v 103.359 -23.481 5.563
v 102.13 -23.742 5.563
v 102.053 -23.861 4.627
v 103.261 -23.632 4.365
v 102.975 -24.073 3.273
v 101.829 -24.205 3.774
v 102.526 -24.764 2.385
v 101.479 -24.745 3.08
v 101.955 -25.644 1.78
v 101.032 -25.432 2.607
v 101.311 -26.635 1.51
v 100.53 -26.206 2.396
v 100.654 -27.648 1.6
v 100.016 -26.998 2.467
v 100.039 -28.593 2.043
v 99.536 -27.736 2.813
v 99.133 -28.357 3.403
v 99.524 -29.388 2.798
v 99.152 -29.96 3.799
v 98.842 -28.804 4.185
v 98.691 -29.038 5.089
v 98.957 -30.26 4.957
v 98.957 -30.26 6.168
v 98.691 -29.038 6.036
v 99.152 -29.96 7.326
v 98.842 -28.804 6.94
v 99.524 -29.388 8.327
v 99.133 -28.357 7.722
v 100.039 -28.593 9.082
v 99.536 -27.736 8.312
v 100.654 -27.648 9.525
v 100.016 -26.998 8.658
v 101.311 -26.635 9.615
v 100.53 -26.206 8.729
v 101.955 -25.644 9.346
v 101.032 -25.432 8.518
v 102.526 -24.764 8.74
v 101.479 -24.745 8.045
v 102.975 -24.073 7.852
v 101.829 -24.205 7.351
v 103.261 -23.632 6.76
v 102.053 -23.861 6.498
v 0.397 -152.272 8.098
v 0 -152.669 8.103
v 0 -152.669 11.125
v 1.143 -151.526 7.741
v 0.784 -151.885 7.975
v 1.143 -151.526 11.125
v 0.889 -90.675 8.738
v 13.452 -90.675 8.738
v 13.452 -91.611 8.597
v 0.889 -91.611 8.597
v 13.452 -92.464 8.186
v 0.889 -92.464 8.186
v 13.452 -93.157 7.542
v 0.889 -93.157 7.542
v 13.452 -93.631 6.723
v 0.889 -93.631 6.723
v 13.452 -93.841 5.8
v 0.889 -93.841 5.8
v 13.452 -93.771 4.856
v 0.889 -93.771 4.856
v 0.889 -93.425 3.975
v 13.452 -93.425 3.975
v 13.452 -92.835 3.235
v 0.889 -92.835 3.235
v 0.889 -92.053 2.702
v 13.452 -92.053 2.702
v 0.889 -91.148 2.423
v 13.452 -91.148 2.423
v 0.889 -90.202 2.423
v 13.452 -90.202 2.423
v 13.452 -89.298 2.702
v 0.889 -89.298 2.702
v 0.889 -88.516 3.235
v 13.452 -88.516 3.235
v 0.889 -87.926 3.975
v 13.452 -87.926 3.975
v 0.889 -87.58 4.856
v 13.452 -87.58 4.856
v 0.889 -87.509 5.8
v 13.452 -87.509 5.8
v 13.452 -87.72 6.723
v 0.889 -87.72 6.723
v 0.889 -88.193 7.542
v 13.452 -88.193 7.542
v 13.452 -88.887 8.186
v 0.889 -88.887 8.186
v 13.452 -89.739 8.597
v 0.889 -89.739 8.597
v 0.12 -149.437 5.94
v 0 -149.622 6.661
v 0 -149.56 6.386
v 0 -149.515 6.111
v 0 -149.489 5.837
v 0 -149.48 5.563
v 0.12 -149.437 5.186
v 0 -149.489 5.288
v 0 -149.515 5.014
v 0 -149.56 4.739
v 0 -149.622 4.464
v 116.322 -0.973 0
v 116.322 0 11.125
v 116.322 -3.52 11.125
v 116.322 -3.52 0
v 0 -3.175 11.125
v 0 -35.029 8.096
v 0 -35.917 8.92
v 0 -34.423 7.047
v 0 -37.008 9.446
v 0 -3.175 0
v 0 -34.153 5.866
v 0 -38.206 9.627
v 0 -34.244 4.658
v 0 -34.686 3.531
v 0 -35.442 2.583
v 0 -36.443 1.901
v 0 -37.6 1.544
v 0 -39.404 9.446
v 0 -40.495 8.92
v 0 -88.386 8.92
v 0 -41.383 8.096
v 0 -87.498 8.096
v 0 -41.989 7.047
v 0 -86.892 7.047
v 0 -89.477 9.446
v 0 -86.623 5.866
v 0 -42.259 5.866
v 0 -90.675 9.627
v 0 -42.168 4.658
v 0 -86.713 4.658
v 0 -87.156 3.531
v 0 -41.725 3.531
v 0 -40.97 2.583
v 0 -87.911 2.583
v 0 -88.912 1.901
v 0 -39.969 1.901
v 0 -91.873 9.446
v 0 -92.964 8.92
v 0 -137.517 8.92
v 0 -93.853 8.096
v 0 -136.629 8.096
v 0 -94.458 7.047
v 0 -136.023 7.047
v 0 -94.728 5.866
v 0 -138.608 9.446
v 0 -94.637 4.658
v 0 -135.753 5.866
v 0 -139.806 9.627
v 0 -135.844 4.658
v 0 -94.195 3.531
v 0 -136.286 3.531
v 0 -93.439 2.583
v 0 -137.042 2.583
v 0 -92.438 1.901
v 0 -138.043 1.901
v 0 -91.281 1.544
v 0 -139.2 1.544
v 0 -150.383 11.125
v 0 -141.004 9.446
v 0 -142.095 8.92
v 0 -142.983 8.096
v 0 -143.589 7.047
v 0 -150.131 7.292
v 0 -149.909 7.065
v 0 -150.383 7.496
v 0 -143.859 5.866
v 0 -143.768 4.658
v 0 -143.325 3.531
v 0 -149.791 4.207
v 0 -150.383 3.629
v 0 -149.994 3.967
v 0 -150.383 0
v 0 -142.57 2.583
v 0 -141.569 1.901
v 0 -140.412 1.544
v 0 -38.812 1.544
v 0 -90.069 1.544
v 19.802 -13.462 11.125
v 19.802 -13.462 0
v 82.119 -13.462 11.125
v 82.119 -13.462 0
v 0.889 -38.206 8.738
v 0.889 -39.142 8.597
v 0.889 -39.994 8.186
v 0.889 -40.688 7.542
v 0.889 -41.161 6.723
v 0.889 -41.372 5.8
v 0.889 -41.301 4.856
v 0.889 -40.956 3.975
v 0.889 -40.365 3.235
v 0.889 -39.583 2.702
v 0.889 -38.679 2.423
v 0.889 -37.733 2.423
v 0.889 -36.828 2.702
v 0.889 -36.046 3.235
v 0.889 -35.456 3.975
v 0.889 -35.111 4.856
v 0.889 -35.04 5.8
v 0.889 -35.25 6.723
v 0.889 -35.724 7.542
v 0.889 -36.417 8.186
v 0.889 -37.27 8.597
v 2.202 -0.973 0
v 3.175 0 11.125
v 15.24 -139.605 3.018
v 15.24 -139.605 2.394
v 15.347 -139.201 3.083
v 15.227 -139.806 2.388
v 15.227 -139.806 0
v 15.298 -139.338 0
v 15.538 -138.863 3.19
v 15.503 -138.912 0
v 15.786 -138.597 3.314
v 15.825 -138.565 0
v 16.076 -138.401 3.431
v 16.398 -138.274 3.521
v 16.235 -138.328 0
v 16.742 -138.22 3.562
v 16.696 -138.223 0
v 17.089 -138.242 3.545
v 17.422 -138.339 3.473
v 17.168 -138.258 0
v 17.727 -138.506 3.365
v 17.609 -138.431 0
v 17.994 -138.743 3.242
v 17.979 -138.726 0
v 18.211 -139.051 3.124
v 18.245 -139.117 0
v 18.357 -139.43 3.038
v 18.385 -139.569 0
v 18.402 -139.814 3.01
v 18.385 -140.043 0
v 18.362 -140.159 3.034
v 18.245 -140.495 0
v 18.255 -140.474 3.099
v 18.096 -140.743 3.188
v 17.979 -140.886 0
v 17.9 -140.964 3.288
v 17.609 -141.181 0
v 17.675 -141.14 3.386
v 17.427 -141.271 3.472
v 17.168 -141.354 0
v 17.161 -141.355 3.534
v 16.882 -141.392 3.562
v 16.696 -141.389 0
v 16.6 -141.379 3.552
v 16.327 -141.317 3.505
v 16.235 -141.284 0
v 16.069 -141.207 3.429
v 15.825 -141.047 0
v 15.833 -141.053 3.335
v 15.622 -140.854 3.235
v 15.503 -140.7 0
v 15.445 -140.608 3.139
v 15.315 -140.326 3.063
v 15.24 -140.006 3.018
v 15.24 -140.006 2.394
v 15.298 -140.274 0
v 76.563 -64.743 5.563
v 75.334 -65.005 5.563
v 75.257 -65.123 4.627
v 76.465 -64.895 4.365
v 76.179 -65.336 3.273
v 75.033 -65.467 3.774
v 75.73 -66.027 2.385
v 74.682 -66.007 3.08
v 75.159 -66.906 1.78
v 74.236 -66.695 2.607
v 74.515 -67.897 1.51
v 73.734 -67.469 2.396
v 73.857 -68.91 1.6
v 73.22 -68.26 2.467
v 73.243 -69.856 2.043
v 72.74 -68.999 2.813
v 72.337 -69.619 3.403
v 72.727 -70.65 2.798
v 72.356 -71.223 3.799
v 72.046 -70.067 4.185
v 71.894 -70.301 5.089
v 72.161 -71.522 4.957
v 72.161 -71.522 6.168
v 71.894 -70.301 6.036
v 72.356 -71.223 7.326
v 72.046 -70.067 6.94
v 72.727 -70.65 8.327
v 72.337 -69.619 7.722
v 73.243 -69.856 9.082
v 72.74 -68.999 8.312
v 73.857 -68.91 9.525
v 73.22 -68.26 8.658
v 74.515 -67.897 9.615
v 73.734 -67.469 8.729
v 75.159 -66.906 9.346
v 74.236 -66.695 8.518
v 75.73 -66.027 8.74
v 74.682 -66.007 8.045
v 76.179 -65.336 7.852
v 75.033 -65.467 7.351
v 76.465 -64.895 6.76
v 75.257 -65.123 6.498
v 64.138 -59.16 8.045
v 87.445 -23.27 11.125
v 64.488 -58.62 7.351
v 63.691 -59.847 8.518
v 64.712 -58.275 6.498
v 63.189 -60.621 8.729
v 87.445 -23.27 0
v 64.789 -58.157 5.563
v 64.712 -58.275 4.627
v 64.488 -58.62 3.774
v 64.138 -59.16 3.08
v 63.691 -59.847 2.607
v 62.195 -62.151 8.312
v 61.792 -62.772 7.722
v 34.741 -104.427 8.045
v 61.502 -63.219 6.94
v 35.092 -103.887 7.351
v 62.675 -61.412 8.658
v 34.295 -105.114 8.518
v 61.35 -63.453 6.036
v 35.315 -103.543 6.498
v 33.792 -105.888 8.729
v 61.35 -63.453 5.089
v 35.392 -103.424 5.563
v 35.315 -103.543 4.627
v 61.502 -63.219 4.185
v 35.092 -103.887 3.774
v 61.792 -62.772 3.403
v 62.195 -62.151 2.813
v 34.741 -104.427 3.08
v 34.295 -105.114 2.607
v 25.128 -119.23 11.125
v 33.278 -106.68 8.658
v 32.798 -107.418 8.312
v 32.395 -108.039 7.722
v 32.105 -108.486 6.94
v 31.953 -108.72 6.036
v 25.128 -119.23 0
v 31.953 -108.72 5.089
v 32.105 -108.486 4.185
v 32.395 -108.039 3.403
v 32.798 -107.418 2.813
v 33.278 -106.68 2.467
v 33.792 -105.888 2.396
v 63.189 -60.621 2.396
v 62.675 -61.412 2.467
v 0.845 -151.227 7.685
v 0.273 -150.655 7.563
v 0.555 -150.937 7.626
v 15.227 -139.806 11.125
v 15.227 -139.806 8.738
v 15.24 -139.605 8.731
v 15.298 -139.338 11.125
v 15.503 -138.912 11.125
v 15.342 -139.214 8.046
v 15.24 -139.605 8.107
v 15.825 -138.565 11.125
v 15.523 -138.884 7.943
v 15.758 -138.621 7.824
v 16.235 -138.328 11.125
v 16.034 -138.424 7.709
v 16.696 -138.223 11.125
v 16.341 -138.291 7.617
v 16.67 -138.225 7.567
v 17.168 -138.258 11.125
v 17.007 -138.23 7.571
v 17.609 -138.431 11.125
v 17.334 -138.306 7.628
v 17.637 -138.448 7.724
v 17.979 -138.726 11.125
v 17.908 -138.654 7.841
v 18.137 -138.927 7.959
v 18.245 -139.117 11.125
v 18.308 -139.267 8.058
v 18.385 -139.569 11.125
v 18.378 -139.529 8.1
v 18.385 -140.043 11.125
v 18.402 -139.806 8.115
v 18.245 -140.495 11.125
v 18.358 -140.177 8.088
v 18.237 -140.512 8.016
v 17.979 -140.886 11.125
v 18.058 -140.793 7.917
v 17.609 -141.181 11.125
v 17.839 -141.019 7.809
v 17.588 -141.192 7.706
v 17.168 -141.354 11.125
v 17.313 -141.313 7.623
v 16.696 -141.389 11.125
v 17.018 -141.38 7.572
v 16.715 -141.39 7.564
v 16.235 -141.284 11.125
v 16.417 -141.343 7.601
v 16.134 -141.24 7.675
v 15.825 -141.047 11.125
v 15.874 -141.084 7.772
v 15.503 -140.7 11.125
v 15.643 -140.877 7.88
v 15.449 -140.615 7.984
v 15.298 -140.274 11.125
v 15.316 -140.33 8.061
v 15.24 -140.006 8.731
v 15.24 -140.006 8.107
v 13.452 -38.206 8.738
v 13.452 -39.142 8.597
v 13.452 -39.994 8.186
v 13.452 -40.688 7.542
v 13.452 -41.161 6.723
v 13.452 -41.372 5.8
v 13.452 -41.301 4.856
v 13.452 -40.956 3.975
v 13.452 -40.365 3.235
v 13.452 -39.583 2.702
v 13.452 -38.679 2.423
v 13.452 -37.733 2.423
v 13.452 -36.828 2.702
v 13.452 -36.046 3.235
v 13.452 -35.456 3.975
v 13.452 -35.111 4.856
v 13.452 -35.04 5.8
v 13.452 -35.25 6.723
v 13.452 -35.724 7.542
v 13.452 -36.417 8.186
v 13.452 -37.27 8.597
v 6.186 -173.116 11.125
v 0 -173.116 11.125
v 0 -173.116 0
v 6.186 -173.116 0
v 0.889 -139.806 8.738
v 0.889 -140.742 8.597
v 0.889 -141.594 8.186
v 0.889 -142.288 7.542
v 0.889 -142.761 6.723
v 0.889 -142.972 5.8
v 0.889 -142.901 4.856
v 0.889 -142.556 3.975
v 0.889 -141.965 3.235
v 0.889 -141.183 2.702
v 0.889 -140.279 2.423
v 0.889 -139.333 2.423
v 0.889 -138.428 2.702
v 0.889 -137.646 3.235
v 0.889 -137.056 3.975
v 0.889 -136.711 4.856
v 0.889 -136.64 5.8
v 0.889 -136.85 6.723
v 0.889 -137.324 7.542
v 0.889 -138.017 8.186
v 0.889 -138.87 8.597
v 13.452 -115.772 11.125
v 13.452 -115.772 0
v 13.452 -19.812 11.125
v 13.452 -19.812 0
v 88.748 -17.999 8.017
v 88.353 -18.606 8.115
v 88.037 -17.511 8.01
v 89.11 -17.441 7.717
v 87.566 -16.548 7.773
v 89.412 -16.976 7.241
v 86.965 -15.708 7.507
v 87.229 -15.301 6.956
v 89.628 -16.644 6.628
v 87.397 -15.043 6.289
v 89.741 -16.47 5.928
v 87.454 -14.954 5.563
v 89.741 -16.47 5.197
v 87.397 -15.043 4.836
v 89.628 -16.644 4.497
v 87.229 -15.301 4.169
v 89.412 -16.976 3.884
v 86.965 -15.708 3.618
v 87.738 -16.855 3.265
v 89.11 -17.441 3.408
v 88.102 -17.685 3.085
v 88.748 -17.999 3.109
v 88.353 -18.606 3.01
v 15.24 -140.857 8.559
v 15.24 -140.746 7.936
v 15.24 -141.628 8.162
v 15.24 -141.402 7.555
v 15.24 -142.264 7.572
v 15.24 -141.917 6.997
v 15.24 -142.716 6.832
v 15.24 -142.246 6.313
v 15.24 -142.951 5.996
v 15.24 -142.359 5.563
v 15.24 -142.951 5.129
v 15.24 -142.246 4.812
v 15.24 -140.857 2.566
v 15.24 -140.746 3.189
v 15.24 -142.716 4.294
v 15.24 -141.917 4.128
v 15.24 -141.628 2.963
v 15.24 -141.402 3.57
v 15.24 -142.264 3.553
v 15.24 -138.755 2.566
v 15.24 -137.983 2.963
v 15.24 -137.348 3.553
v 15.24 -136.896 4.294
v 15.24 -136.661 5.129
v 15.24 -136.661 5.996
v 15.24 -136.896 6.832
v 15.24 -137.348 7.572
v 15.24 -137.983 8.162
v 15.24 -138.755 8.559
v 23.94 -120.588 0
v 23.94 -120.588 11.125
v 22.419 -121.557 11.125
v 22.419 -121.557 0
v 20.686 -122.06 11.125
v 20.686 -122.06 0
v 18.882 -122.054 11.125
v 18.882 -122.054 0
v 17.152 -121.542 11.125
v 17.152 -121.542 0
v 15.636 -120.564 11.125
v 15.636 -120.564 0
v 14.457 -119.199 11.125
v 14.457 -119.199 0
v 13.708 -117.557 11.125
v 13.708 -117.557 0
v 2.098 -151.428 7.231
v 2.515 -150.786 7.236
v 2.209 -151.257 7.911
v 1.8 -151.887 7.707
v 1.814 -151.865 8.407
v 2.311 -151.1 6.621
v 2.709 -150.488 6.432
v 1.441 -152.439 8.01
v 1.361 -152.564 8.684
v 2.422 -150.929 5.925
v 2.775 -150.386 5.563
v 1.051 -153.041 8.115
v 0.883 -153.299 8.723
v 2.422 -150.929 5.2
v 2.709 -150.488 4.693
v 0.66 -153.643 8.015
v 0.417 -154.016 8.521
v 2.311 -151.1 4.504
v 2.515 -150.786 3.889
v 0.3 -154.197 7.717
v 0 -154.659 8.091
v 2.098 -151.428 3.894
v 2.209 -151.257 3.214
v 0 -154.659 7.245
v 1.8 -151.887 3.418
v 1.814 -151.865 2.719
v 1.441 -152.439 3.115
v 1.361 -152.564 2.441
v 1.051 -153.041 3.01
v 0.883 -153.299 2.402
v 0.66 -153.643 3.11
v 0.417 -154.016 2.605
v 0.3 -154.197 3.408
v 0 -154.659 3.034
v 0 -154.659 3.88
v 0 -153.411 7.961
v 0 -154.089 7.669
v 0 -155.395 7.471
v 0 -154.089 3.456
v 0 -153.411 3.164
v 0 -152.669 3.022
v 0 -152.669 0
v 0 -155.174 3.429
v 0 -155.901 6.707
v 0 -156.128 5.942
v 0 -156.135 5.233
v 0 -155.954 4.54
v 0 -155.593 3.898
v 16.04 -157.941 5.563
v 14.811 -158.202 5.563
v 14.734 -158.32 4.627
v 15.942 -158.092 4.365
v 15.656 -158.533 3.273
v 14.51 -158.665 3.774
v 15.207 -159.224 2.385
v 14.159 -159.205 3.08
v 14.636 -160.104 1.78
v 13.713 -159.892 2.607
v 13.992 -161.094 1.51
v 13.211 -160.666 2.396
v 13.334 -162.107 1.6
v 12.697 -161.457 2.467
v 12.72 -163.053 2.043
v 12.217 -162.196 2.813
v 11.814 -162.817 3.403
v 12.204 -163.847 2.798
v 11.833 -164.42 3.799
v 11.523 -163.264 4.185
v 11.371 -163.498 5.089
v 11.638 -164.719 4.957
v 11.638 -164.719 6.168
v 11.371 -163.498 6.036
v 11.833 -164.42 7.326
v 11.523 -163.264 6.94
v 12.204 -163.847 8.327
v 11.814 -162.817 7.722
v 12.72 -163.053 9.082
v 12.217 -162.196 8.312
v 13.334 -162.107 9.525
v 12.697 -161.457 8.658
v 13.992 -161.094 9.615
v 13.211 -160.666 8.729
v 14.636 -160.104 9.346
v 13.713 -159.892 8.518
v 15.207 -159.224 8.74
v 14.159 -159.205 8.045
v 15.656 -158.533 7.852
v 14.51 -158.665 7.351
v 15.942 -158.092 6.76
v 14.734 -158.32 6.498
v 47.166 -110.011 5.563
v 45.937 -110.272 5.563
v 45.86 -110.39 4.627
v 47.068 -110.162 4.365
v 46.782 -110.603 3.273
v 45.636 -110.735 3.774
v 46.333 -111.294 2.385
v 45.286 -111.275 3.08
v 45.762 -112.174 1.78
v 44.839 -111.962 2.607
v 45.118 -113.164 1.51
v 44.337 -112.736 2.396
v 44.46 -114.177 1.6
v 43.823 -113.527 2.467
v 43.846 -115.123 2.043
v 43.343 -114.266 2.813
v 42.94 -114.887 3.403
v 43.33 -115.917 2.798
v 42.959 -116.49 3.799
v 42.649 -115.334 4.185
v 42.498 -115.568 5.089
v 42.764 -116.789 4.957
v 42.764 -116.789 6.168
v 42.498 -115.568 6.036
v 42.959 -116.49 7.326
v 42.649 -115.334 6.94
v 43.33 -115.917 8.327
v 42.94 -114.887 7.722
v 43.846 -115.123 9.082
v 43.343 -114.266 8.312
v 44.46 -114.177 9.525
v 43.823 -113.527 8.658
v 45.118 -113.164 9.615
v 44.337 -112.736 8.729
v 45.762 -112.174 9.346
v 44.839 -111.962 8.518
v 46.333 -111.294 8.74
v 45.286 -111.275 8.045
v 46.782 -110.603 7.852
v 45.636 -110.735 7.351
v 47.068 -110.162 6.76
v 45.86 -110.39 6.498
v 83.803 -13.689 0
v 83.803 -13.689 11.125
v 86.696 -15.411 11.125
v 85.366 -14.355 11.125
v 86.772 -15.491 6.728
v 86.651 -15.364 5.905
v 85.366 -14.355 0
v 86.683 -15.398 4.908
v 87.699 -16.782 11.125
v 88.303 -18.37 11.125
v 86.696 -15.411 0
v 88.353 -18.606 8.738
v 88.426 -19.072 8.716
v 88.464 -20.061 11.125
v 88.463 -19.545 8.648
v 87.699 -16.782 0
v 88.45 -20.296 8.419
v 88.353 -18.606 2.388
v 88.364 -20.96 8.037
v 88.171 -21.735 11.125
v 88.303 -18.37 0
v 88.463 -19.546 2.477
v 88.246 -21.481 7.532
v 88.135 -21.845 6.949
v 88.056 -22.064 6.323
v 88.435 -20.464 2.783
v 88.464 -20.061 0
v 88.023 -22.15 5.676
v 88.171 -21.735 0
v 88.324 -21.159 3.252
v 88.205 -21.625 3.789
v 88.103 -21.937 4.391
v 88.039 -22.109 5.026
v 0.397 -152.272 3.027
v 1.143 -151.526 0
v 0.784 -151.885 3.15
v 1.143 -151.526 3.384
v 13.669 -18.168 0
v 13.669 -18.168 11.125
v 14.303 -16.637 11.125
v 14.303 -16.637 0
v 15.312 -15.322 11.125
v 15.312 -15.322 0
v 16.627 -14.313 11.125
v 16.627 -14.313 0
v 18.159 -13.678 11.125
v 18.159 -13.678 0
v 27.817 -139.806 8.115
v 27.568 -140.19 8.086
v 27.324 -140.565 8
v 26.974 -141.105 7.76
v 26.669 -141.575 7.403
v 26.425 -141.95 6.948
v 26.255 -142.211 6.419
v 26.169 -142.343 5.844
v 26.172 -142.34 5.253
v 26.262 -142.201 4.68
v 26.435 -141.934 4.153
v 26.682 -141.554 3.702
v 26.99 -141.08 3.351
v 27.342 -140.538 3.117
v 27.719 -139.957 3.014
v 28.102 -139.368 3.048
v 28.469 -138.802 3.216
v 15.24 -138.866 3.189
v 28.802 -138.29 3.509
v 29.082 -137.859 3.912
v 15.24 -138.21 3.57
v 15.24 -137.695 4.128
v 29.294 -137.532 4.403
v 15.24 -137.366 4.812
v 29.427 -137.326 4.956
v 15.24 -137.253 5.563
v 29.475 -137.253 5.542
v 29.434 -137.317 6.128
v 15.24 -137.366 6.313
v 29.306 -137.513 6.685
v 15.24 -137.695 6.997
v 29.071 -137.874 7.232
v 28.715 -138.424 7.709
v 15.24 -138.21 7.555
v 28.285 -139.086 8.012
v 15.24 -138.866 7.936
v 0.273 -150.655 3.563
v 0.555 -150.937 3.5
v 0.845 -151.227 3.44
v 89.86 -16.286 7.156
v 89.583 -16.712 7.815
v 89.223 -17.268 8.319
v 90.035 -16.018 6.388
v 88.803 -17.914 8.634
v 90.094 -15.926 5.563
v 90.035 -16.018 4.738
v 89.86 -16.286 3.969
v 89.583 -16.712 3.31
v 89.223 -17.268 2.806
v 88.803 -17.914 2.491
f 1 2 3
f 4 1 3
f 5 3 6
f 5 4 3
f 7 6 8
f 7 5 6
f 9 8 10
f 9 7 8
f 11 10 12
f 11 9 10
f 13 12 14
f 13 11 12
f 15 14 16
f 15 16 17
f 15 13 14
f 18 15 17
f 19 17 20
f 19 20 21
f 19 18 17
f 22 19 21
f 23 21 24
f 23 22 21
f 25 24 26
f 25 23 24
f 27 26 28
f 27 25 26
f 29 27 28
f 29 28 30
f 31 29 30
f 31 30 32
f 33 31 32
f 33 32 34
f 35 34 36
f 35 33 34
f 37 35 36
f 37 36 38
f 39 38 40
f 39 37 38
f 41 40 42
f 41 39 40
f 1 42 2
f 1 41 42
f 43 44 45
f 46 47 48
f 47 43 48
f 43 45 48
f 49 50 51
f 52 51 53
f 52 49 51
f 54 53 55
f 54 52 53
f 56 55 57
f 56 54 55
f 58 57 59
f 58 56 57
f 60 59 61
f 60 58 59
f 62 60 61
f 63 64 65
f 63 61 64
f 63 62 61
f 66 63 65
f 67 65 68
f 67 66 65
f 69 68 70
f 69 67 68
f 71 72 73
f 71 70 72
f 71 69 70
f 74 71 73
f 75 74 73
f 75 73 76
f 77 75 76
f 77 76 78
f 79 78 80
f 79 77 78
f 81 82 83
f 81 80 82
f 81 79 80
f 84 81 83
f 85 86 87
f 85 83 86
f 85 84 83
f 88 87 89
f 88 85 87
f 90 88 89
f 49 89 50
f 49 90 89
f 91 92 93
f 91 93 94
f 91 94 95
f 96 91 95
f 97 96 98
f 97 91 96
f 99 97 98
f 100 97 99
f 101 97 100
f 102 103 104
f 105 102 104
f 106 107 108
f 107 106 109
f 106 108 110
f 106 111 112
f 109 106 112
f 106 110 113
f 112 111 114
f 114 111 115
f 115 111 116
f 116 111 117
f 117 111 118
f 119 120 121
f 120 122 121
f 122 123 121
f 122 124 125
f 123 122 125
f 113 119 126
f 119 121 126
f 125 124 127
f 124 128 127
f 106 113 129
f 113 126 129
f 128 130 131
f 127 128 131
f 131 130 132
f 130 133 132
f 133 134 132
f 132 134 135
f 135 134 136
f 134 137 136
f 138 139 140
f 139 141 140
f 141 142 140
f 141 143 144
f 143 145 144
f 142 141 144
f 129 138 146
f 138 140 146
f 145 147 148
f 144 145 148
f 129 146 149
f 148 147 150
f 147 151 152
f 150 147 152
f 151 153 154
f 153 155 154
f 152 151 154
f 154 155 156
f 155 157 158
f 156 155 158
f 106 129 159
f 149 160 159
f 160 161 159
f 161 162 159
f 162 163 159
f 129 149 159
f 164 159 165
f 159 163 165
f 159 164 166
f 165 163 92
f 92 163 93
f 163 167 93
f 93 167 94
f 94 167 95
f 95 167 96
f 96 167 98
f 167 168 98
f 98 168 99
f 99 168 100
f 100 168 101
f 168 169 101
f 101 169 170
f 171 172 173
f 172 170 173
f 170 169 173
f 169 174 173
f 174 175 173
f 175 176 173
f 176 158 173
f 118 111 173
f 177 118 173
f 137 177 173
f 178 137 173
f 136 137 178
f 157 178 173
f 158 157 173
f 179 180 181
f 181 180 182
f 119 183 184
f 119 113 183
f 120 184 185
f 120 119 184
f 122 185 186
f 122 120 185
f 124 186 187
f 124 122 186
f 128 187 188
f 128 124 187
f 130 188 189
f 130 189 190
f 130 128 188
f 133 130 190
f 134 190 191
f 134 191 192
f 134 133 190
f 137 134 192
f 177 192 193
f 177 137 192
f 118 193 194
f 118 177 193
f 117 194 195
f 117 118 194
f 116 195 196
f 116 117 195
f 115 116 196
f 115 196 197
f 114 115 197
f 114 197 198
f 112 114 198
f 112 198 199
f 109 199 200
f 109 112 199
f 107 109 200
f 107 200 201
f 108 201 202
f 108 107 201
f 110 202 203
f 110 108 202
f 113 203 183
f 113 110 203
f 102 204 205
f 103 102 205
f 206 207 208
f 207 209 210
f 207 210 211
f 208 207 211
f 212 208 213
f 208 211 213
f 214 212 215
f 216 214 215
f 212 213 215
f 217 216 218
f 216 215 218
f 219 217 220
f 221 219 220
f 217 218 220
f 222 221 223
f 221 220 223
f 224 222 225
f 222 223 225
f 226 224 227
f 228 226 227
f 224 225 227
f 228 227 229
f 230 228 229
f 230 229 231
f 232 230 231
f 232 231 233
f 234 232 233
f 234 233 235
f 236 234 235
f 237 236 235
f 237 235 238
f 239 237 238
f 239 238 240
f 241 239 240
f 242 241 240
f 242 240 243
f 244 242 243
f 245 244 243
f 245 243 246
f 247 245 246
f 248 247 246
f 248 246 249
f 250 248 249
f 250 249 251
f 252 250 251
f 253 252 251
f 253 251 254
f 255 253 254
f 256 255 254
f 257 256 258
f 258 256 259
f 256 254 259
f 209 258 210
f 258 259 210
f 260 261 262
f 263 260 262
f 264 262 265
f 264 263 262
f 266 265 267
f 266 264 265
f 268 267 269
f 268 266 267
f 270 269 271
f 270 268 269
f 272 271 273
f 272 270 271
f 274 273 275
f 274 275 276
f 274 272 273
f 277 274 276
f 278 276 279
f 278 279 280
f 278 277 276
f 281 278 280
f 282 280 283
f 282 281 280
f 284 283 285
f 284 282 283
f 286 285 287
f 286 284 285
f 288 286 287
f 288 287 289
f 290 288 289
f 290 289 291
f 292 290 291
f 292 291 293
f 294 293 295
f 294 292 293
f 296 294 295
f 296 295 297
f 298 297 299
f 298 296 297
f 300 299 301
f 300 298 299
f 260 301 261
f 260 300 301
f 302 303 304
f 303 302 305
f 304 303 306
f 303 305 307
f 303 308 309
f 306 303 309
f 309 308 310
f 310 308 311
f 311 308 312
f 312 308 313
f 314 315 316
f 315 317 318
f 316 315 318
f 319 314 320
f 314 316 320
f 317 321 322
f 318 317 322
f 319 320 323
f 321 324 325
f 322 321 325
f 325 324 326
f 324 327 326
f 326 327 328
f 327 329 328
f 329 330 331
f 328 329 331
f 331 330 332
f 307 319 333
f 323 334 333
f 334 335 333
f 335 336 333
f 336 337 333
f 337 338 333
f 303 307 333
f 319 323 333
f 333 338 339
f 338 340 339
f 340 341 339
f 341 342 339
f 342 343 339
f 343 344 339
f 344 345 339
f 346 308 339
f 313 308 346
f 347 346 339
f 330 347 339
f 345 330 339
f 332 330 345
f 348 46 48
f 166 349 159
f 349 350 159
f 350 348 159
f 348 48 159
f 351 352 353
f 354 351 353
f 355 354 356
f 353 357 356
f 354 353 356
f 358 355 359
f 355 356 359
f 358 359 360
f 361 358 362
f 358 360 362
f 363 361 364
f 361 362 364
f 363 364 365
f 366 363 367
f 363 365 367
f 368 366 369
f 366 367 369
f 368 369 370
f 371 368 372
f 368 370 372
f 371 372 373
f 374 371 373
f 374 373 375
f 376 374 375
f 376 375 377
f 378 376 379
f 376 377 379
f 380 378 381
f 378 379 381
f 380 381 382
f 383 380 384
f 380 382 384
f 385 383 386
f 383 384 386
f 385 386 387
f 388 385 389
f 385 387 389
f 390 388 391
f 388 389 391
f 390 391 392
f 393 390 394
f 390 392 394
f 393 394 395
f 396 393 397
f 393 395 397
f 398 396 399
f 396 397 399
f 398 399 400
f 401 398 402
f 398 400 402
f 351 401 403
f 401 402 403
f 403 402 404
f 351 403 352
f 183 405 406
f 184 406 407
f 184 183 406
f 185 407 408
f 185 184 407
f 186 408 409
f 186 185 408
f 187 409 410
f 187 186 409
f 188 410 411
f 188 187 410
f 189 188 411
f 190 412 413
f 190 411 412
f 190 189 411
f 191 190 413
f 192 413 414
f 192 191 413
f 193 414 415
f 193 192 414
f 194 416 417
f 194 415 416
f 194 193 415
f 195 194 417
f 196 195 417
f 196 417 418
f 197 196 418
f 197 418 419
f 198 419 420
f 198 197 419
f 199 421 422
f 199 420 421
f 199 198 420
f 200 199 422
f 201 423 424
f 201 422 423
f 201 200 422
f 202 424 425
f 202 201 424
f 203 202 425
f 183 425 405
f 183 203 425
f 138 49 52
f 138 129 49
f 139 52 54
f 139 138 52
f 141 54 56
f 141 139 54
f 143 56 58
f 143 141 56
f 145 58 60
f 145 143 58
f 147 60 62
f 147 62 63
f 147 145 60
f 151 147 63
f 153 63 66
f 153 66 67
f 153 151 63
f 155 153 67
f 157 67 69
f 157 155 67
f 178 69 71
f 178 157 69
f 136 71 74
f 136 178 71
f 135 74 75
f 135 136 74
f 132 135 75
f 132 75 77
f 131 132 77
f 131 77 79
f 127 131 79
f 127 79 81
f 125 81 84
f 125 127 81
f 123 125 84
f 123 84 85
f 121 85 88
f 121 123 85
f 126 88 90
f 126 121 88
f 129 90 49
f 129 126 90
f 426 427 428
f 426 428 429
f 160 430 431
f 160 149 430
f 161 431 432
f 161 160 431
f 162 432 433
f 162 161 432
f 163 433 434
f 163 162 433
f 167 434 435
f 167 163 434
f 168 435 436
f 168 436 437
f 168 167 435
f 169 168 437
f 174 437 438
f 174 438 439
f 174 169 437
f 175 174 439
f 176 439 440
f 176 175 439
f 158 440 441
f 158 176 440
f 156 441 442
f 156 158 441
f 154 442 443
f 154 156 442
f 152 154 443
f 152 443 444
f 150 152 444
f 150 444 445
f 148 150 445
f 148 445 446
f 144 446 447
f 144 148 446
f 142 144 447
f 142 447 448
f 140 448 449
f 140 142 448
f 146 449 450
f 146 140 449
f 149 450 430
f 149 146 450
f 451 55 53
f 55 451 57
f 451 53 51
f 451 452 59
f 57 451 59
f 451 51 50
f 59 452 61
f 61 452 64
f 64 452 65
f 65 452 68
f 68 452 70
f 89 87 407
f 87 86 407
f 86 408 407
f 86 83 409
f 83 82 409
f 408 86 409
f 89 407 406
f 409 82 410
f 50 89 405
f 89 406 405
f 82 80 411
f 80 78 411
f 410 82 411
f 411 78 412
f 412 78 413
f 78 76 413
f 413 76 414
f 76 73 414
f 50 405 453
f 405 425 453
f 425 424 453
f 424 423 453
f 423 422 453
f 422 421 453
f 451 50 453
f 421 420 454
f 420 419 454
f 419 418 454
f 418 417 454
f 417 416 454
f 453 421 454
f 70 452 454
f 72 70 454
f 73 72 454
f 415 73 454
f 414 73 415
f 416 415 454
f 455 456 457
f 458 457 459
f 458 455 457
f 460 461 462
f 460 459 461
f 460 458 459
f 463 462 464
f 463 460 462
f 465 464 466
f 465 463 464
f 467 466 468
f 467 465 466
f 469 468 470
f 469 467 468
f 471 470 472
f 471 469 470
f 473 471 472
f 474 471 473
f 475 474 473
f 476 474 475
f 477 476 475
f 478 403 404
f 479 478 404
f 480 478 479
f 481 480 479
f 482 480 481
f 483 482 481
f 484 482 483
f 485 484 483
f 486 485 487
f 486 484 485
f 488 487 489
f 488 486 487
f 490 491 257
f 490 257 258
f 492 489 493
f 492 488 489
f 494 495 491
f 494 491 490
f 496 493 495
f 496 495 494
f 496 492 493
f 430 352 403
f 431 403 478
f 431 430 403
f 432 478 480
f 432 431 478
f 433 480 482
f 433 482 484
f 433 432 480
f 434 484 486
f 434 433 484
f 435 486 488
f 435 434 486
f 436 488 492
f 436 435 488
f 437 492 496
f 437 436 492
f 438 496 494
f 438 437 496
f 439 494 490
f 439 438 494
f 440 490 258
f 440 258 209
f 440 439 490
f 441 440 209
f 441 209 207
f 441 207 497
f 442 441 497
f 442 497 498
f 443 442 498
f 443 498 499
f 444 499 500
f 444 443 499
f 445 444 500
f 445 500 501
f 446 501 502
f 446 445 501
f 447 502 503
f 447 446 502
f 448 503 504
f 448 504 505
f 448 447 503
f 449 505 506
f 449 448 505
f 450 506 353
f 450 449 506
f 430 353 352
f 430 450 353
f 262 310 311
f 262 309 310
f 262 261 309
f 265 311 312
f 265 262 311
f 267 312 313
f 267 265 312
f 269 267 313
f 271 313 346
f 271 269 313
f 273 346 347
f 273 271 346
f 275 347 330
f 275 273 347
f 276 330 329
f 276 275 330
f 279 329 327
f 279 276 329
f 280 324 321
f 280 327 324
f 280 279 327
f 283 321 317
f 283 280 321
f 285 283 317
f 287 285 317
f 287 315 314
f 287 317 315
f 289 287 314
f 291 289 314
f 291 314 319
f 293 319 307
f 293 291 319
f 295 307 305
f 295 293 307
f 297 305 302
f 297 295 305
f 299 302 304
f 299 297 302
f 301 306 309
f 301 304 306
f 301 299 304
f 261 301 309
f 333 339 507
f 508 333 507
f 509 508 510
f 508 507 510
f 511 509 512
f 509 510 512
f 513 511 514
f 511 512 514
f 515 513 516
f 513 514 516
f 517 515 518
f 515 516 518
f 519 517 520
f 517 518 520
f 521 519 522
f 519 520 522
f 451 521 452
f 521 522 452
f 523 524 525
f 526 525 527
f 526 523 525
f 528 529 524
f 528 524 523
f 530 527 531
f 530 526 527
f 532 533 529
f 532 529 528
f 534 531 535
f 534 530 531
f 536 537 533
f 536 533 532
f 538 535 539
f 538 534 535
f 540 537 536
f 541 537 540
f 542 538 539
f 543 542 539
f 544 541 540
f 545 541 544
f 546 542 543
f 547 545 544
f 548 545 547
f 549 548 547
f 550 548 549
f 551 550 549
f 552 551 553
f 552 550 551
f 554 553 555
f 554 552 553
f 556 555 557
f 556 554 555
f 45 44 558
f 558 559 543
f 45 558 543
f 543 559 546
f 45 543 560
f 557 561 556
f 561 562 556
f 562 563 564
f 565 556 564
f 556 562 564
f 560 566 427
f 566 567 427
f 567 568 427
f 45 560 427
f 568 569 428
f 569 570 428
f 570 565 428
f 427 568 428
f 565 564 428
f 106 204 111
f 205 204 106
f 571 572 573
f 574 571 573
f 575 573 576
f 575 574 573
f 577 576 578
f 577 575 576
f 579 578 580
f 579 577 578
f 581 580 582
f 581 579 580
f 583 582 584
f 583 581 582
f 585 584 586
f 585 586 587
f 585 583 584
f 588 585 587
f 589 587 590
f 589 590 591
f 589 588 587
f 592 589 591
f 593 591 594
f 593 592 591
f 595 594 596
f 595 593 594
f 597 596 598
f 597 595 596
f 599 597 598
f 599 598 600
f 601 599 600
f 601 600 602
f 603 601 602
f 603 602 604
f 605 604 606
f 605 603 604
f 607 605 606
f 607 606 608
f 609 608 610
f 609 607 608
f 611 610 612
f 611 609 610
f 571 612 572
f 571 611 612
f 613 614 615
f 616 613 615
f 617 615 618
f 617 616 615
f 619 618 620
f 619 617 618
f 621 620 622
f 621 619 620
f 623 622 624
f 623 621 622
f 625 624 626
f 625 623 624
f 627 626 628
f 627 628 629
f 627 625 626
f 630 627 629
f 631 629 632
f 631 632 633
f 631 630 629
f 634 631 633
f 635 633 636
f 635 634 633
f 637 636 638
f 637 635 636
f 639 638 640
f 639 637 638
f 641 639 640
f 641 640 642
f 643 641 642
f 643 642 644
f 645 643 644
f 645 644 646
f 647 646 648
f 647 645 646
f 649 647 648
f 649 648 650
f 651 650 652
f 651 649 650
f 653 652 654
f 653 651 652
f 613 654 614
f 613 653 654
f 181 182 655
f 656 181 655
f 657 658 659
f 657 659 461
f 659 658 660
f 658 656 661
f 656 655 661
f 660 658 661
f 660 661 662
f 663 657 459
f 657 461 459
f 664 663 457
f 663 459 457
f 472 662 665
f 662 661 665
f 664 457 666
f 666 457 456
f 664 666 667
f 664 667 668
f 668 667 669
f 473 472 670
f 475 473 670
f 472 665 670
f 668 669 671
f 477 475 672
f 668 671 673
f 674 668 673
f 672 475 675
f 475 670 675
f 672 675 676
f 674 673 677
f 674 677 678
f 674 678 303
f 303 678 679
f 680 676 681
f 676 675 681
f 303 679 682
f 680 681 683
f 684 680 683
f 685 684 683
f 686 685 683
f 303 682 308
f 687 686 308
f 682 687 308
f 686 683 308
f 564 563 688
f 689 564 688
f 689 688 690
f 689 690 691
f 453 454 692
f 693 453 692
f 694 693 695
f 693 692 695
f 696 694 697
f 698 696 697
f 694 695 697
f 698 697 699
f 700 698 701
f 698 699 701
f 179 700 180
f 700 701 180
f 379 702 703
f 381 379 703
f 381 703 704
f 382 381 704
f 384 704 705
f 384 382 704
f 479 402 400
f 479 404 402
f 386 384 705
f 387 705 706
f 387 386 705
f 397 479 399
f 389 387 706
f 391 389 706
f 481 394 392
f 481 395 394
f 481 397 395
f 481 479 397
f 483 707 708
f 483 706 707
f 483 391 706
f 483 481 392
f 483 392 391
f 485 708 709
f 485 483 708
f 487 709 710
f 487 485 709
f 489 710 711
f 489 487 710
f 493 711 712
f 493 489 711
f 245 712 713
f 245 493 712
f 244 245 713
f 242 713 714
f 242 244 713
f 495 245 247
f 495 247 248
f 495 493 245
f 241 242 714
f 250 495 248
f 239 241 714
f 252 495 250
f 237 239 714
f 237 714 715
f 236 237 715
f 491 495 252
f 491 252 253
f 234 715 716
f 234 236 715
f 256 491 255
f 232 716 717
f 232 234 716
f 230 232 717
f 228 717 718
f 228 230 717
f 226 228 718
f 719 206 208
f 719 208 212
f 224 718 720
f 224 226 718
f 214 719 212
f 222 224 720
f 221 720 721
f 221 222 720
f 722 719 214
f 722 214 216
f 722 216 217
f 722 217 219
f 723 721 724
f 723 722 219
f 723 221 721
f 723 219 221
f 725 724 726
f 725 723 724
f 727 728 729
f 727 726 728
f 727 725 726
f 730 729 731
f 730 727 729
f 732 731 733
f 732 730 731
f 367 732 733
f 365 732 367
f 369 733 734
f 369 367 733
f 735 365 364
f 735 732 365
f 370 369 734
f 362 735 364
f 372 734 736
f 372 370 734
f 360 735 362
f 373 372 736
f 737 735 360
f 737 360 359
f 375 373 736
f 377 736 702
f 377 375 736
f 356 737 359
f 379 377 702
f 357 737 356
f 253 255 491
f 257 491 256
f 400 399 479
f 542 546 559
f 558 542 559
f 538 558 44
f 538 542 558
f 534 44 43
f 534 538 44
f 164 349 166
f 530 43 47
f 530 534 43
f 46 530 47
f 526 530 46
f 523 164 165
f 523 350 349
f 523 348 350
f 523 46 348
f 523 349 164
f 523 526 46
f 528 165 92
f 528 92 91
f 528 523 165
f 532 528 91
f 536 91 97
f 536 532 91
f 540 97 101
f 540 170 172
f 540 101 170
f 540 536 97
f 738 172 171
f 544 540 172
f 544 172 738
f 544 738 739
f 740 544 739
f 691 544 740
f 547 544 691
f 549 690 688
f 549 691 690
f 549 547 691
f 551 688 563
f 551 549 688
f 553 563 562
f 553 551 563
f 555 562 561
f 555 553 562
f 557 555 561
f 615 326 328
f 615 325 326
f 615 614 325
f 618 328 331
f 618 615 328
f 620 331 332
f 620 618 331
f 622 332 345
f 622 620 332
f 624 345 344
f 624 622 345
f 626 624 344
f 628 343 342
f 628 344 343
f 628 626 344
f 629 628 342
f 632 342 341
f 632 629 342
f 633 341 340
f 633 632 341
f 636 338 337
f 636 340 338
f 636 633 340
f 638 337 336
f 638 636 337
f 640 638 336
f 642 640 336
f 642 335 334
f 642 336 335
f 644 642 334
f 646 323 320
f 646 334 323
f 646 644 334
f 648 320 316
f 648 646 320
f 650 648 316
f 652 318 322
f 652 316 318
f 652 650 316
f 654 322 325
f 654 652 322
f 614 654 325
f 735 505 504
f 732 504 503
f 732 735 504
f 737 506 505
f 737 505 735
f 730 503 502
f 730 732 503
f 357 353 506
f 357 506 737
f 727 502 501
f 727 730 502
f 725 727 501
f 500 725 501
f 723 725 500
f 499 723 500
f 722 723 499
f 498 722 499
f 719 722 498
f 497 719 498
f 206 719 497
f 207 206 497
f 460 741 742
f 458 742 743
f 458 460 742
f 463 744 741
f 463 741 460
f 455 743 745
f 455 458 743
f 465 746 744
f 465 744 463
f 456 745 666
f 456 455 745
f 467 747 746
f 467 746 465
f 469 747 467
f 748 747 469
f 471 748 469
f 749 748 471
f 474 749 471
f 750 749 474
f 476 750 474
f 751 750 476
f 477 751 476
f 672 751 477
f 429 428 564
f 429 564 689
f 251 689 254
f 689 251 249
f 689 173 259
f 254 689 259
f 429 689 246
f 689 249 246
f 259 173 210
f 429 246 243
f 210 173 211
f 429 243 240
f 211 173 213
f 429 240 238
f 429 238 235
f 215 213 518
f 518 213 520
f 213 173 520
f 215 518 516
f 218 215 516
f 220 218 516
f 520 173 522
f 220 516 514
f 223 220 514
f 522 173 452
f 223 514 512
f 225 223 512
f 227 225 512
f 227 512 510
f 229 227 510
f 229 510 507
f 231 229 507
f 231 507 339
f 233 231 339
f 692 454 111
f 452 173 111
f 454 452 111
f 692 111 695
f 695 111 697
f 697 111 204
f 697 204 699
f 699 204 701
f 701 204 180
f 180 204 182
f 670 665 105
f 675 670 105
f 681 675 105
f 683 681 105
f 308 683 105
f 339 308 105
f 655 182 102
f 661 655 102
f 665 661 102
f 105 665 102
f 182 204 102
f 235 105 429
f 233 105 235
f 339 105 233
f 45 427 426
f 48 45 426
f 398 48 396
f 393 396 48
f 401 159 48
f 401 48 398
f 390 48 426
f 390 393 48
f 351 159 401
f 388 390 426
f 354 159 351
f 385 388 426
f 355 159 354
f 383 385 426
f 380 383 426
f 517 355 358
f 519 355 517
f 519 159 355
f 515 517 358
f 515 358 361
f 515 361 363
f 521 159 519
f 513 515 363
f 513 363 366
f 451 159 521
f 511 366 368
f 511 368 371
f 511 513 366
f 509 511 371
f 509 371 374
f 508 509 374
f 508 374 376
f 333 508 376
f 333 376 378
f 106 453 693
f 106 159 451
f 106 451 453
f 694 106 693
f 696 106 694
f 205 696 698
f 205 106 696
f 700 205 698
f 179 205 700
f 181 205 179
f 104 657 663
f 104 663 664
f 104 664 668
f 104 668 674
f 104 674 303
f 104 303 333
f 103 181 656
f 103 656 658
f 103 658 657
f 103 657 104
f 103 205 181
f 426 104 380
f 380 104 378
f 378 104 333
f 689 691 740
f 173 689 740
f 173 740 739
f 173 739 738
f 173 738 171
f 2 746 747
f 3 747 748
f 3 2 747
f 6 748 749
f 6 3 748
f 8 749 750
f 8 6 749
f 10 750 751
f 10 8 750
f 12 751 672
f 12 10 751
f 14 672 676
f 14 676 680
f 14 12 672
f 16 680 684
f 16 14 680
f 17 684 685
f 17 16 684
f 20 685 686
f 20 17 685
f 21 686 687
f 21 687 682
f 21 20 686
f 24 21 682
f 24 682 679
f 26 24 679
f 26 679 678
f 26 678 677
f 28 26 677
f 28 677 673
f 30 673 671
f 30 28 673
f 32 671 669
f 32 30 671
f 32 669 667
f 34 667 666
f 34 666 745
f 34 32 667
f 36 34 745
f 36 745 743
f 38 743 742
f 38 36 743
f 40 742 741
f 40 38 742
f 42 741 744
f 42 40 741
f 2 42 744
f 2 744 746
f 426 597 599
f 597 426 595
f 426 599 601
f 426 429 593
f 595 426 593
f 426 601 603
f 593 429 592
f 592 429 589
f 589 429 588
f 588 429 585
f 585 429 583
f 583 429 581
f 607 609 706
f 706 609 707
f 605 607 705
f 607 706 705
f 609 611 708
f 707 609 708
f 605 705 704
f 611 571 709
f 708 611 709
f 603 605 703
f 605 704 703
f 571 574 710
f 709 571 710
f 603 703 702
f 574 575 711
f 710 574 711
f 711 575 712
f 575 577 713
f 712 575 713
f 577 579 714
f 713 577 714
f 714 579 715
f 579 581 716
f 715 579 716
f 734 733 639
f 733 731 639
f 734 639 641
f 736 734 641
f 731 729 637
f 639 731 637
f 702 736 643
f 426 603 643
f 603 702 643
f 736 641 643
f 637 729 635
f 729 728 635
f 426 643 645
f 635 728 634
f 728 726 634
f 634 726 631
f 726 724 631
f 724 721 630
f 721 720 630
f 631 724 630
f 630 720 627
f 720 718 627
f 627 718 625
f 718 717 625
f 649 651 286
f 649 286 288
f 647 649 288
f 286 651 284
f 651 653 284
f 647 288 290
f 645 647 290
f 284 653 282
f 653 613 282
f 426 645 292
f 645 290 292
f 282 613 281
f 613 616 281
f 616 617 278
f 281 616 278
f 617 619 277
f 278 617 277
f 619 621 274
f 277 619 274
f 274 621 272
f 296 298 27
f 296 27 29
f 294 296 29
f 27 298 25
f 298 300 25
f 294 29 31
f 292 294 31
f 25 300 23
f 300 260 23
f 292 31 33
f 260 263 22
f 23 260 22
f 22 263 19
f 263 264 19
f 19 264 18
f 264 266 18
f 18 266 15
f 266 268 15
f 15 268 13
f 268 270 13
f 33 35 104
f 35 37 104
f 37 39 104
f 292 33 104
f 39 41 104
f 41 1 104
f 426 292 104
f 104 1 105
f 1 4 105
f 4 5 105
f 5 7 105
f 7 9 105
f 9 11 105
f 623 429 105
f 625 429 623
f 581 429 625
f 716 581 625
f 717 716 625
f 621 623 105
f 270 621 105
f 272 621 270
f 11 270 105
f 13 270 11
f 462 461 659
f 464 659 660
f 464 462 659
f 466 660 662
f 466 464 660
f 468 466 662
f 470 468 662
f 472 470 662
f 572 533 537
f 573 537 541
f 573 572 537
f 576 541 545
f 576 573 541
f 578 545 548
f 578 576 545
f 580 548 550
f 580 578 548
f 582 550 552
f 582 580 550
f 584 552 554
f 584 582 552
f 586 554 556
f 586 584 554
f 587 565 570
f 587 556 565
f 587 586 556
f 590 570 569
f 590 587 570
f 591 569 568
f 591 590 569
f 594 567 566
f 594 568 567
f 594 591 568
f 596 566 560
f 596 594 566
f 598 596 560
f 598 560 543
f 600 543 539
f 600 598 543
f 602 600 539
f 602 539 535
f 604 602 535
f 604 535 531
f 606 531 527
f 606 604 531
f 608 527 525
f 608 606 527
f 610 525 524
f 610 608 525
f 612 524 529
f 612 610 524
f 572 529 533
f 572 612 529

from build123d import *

# Parameters (mm, degrees)
BOSS_EXTRUDE1_DEPTH              = 11.1252
F_1_4_20_TAPPED_HOLE1_AT_2_COUNT = 2
F_1_4_20_TAPPED_HOLE1_AT_2_PITCH = 101.6
F_1_4_20_TAPPED_HOLE1_AT_3_COUNT = 2
F_1_4_20_TAPPED_HOLE1_AT_3_PITCH = 49.130736385
F_1_4_20_TAPPED_HOLE2_AT_2_COUNT = 2
F_1_4_20_TAPPED_HOLE2_AT_2_PITCH = 53.975
F_1_4_20_TAPPED_HOLE2_AT_3_COUNT = 2
F_1_4_20_TAPPED_HOLE2_AT_3_PITCH = 111.125
F_1_4_20_TAPPED_HOLE2_AT_4_COUNT = 2
F_1_4_20_TAPPED_HOLE2_AT_4_PITCH = 49.1998
CUT_EXTRUDE1_DEPTH               = 12.1252001
CHAMFER3_SIZE                    = 3.175
CUT_EXTRUDE2_DEPTH               = 119.608154476
CUT_EXTRUDE3_DEPTH               = 12.1252001
F_1_8_0_125_DIAMETER_HOLE1_D     = 3.175
CUT_EXTRUDE4_DEPTH               = 12.1252001


with BuildPart() as part:
    # Sketch1 → Boss-Extrude1 (new body)
    with BuildSketch(Plane.XY):
        Polygon((0, 0), (0, -182.6405415), (118.608154476, 0), align=None)
        with BuildLine():
            Line((19.802154476, -13.462), (82.118989682, -13.462))
            ThreePointArc((82.118989682, -13.462), (87.699478347, -16.782041872), (87.444547788, -23.270457872))
            Line((87.444547788, -23.270457872), (25.127712583, -119.229969062))
            ThreePointArc((25.127712583, -119.229969062), (17.998657037, -121.860016506), (13.452154476, -115.771511189))
            Line((13.452154476, -115.771511189), (13.452154476, -19.812))
            ThreePointArc((13.452154476, -19.812), (15.312026416, -15.321871939), (19.802154476, -13.462))
        make_face(mode=Mode.SUBTRACT)
    extrude(amount=BOSS_EXTRUDE1_DEPTH)

    # Sketch3 → 1/4-20 Tapped Hole1 (revolve, cut)
    with BuildSketch(Plane(origin=(0, -139.805902277, 5.5626), x_dir=(0, 0, 1), z_dir=(0, 1, 0))):
        Polygon((0, 0), (0, 32.217016902), (2.5527, 30.6832), (2.5527, 15.24), (3.175, 15.24), (3.175, 0.889), (4.064, 0), align=None)
    f_1_4_20_tapped_hole1 = revolve(axis=Axis((-6.35, -139.805902277, 5.5626), (1, 0, 0)), mode=Mode.SUBTRACT)

    # 1/4-20 Tapped Hole1 at 2: 1/4-20 Tapped Hole1 ×2
    with Locations(*[(0, i * F_1_4_20_TAPPED_HOLE1_AT_2_PITCH, 0) for i in range(1, F_1_4_20_TAPPED_HOLE1_AT_2_COUNT)]):
        add(f_1_4_20_tapped_hole1, mode=Mode.SUBTRACT)

    # 1/4-20 Tapped Hole1 at 3: 1/4-20 Tapped Hole1 ×2
    with Locations(*[(0, i * F_1_4_20_TAPPED_HOLE1_AT_3_PITCH, 0) for i in range(1, F_1_4_20_TAPPED_HOLE1_AT_3_COUNT)]):
        add(f_1_4_20_tapped_hole1, mode=Mode.SUBTRACT)

    # Sketch6 → 1/4-20 Tapped Hole2 (revolve, cut)
    with BuildSketch(Plane(origin=(74.349919226, -68.151705822, 5.5626), x_dir=(0.544639035, 0.838670568, 0), z_dir=(0, 0, 1))):
        Polygon((0, 0), (0, 19.517016902), (2.5527, 17.9832), (2.5527, 15.24), (3.175, 15.24), (3.175, 0.889), (4.064, 0), align=None)
    f_1_4_20_tapped_hole2 = revolve(axis=Axis((79.675477332, -71.610163694, 5.5626), (-0.838670568, 0.544639035, 0)), mode=Mode.SUBTRACT)

    # 1/4-20 Tapped Hole2 at 2: 1/4-20 Tapped Hole2 ×2
    with Locations(*[Vector(-0.544639035, -0.838670568, 0) * (i * F_1_4_20_TAPPED_HOLE2_AT_2_PITCH) for i in range(1, F_1_4_20_TAPPED_HOLE2_AT_2_COUNT)]):
        add(f_1_4_20_tapped_hole2, mode=Mode.SUBTRACT)

    # 1/4-20 Tapped Hole2 at 3: 1/4-20 Tapped Hole2 ×2
    with Locations(*[Vector(-0.544639035, -0.838670568, 0) * (i * F_1_4_20_TAPPED_HOLE2_AT_3_PITCH) for i in range(1, F_1_4_20_TAPPED_HOLE2_AT_3_COUNT)]):
        add(f_1_4_20_tapped_hole2, mode=Mode.SUBTRACT)

    # 1/4-20 Tapped Hole2 at 4: 1/4-20 Tapped Hole2 ×2
    with Locations(*[Vector(0.544639035, 0.838670568, 0) * (i * F_1_4_20_TAPPED_HOLE2_AT_4_PITCH) for i in range(1, F_1_4_20_TAPPED_HOLE2_AT_4_COUNT)]):
        add(f_1_4_20_tapped_hole2, mode=Mode.SUBTRACT)

    # Sketch8 → Cut-Extrude1 (cut, through all)
    with BuildSketch(Plane.XY.offset(11.1252)):
        Polygon((0, -182.6405415), (0, -173.1155415), (6.185607325, -173.1155415), align=None)
    extrude(amount=-CUT_EXTRUDE1_DEPTH, mode=Mode.SUBTRACT)

    # Chamfer3
    chamfer3_edges = [part.edges().sort_by_distance(p)[0] for p in [
        (0, 0, 5.5626),
    ]]
    chamfer(chamfer3_edges, length=CHAMFER3_SIZE)

    # Sketch9 → Cut-Extrude2 (cut, through all)
    with BuildSketch(Plane.ZY):
        Polygon((11.1252, 0), (0, 0), (0, -0.973328879), align=None)
    extrude(amount=-CUT_EXTRUDE2_DEPTH, mode=Mode.SUBTRACT)

    # Sketch10 → Cut-Extrude3 (cut, through all)
    with BuildSketch(Plane.XY.offset(11.1252)):
        Polygon((118.608154476, 0), (116.322154476, 0), (116.322154476, -3.520131307), align=None)
    extrude(amount=-CUT_EXTRUDE3_DEPTH, mode=Mode.SUBTRACT)

    # 1/8 (0.125) Diameter Hole1 (through all)
    with Locations(Plane.XY.offset(11.1252)):
        with Locations((16.8148, -139.805902277)):
            Hole(F_1_8_0_125_DIAMETER_HOLE1_D / 2)

    # Sketch14 → Cut-Extrude4 (cut, through all)
    with BuildSketch(Plane.XY.offset(11.1252)):
        Polygon((0, -150.3825415), (0, -152.6685415), (1.143, -151.5255415), align=None)
    extrude(amount=-CUT_EXTRUDE4_DEPTH, mode=Mode.SUBTRACT)


solid = part.part
